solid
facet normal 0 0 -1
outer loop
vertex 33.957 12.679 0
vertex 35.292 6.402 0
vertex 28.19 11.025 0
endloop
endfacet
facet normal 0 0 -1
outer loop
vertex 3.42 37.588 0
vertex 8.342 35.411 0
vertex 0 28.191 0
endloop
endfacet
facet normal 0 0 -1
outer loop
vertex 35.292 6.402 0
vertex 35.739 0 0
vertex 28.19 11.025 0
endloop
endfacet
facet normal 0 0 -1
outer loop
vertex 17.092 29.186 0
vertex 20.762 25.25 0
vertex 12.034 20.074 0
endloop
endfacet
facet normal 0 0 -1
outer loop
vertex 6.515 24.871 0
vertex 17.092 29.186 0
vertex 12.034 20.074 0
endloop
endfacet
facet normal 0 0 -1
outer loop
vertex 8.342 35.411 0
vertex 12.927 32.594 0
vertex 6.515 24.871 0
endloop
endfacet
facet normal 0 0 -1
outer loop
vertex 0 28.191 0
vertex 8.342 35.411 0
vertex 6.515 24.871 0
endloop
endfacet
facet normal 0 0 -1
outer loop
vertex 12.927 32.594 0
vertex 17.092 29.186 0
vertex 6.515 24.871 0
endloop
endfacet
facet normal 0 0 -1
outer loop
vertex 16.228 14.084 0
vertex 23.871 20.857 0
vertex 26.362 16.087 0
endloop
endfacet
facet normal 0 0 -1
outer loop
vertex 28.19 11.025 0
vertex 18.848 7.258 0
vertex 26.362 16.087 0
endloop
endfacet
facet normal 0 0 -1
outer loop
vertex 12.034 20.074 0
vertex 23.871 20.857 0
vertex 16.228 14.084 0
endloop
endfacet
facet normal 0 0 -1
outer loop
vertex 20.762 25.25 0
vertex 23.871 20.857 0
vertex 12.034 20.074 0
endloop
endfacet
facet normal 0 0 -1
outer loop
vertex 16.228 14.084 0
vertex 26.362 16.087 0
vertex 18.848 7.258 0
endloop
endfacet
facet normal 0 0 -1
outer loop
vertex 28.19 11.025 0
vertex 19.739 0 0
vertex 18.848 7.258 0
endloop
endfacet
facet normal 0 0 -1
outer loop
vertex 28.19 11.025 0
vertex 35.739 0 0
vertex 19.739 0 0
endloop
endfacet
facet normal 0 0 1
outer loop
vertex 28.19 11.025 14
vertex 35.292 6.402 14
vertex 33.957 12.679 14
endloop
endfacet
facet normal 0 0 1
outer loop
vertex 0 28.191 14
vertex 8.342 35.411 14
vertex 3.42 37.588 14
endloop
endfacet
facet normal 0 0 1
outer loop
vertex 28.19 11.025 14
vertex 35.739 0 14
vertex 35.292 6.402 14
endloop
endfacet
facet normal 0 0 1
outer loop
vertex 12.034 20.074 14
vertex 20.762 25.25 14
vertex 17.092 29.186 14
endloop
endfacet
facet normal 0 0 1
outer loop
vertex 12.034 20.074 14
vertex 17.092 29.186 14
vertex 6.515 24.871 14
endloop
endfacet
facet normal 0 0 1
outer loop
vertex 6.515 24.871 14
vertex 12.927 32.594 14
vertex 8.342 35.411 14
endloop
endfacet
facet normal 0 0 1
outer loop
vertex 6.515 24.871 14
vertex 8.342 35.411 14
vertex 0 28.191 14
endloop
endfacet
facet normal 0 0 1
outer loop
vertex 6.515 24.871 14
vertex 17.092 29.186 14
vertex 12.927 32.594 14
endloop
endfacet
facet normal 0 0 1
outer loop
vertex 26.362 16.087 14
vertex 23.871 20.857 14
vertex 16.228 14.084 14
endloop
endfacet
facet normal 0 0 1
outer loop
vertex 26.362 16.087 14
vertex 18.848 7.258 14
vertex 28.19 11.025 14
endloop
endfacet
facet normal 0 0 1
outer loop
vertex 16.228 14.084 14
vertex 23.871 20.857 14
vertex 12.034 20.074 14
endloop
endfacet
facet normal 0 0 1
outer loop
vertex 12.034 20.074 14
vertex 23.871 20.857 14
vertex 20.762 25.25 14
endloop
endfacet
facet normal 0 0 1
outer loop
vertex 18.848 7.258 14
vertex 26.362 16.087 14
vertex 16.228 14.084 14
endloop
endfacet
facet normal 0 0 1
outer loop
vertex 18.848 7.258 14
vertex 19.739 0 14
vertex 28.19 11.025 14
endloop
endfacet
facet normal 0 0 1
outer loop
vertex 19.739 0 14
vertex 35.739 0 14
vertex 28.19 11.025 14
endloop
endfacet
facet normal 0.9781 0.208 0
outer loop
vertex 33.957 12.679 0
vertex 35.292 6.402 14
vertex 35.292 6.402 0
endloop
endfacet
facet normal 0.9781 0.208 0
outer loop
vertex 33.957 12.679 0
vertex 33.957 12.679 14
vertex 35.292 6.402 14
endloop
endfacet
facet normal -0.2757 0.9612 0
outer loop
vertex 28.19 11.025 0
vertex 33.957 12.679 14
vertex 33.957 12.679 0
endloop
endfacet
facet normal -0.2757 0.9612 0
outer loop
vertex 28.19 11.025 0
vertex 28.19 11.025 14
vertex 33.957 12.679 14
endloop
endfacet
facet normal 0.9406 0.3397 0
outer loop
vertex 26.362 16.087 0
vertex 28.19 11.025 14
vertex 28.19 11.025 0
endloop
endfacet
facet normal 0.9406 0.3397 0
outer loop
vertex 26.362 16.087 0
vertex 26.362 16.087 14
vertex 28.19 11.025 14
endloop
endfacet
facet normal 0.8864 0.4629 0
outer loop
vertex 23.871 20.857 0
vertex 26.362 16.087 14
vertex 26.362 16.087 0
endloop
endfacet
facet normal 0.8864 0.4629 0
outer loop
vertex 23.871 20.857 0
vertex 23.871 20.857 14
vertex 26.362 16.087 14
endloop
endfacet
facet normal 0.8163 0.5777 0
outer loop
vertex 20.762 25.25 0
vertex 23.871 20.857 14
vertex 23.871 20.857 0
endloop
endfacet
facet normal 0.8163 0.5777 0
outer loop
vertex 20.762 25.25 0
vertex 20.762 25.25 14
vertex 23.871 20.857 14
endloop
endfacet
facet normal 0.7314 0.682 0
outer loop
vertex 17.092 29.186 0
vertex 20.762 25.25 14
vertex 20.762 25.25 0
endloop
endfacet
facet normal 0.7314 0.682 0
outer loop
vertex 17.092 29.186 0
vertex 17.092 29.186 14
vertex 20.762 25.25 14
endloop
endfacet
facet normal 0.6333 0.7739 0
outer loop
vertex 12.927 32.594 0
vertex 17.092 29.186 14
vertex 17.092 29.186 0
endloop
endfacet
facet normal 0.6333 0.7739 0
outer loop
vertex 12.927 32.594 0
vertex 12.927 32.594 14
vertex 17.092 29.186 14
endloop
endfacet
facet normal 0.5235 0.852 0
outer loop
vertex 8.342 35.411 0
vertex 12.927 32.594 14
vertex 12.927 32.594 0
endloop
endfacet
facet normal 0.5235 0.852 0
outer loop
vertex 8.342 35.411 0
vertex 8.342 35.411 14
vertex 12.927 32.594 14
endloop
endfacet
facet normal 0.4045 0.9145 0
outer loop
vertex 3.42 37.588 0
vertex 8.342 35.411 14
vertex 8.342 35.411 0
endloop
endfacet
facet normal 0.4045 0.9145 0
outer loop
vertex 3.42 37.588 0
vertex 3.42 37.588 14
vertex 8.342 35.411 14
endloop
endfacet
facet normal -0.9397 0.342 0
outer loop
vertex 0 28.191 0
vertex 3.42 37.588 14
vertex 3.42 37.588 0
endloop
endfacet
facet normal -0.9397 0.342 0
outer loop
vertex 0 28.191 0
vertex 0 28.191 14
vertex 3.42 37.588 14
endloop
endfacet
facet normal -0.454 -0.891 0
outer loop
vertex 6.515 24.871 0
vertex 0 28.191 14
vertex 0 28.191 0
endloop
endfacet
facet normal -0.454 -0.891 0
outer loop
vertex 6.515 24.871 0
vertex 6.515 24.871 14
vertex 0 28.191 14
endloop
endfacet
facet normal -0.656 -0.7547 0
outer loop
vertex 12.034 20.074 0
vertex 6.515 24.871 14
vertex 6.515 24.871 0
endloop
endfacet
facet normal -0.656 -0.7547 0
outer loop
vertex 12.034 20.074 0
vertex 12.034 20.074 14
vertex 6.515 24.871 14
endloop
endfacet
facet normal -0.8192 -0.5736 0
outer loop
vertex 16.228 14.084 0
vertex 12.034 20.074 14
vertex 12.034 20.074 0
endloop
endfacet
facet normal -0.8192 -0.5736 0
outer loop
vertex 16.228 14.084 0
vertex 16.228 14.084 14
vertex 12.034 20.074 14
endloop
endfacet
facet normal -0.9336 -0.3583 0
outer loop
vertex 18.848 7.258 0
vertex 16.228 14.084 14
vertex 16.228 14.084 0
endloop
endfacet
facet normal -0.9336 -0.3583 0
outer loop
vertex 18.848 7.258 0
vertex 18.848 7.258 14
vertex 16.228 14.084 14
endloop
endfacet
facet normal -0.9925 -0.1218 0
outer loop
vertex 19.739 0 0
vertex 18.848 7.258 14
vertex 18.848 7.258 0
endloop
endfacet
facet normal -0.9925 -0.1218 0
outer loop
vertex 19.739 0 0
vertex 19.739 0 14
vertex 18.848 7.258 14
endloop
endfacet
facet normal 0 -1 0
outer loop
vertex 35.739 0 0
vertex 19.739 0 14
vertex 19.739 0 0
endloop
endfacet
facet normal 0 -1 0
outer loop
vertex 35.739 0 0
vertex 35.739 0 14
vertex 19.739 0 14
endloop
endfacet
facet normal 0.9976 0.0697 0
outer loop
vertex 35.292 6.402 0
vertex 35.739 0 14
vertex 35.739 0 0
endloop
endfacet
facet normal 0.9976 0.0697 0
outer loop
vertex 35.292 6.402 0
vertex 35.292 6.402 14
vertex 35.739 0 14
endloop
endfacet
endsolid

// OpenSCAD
$fn = 32;

// ----------------------------------------------------------------------
// Arc stop: segment, 14 mm thick
// ----------------------------------------------------------------------

// --- parameters (mm) ---
profile_height = 14;      // extrusion height
profile_points = 17;      // points of the closed outline

profile = [[35.739, 0], [35.292, 6.402], [33.957, 12.679], [28.19, 11.025], [26.362, 16.087], [23.871, 20.857], [20.762, 25.25], [17.092, 29.186], [12.927, 32.594], [8.342, 35.411], [3.42, 37.588], [0, 28.191], [6.515, 24.871], [12.034, 20.074], [16.228, 14.084], [18.848, 7.258], [19.739, 0]];  // single closed polygon, 17 points, counter clockwise

// --- the one profile operation ---
linear_extrude(height = profile_height) polygon(points = profile);
